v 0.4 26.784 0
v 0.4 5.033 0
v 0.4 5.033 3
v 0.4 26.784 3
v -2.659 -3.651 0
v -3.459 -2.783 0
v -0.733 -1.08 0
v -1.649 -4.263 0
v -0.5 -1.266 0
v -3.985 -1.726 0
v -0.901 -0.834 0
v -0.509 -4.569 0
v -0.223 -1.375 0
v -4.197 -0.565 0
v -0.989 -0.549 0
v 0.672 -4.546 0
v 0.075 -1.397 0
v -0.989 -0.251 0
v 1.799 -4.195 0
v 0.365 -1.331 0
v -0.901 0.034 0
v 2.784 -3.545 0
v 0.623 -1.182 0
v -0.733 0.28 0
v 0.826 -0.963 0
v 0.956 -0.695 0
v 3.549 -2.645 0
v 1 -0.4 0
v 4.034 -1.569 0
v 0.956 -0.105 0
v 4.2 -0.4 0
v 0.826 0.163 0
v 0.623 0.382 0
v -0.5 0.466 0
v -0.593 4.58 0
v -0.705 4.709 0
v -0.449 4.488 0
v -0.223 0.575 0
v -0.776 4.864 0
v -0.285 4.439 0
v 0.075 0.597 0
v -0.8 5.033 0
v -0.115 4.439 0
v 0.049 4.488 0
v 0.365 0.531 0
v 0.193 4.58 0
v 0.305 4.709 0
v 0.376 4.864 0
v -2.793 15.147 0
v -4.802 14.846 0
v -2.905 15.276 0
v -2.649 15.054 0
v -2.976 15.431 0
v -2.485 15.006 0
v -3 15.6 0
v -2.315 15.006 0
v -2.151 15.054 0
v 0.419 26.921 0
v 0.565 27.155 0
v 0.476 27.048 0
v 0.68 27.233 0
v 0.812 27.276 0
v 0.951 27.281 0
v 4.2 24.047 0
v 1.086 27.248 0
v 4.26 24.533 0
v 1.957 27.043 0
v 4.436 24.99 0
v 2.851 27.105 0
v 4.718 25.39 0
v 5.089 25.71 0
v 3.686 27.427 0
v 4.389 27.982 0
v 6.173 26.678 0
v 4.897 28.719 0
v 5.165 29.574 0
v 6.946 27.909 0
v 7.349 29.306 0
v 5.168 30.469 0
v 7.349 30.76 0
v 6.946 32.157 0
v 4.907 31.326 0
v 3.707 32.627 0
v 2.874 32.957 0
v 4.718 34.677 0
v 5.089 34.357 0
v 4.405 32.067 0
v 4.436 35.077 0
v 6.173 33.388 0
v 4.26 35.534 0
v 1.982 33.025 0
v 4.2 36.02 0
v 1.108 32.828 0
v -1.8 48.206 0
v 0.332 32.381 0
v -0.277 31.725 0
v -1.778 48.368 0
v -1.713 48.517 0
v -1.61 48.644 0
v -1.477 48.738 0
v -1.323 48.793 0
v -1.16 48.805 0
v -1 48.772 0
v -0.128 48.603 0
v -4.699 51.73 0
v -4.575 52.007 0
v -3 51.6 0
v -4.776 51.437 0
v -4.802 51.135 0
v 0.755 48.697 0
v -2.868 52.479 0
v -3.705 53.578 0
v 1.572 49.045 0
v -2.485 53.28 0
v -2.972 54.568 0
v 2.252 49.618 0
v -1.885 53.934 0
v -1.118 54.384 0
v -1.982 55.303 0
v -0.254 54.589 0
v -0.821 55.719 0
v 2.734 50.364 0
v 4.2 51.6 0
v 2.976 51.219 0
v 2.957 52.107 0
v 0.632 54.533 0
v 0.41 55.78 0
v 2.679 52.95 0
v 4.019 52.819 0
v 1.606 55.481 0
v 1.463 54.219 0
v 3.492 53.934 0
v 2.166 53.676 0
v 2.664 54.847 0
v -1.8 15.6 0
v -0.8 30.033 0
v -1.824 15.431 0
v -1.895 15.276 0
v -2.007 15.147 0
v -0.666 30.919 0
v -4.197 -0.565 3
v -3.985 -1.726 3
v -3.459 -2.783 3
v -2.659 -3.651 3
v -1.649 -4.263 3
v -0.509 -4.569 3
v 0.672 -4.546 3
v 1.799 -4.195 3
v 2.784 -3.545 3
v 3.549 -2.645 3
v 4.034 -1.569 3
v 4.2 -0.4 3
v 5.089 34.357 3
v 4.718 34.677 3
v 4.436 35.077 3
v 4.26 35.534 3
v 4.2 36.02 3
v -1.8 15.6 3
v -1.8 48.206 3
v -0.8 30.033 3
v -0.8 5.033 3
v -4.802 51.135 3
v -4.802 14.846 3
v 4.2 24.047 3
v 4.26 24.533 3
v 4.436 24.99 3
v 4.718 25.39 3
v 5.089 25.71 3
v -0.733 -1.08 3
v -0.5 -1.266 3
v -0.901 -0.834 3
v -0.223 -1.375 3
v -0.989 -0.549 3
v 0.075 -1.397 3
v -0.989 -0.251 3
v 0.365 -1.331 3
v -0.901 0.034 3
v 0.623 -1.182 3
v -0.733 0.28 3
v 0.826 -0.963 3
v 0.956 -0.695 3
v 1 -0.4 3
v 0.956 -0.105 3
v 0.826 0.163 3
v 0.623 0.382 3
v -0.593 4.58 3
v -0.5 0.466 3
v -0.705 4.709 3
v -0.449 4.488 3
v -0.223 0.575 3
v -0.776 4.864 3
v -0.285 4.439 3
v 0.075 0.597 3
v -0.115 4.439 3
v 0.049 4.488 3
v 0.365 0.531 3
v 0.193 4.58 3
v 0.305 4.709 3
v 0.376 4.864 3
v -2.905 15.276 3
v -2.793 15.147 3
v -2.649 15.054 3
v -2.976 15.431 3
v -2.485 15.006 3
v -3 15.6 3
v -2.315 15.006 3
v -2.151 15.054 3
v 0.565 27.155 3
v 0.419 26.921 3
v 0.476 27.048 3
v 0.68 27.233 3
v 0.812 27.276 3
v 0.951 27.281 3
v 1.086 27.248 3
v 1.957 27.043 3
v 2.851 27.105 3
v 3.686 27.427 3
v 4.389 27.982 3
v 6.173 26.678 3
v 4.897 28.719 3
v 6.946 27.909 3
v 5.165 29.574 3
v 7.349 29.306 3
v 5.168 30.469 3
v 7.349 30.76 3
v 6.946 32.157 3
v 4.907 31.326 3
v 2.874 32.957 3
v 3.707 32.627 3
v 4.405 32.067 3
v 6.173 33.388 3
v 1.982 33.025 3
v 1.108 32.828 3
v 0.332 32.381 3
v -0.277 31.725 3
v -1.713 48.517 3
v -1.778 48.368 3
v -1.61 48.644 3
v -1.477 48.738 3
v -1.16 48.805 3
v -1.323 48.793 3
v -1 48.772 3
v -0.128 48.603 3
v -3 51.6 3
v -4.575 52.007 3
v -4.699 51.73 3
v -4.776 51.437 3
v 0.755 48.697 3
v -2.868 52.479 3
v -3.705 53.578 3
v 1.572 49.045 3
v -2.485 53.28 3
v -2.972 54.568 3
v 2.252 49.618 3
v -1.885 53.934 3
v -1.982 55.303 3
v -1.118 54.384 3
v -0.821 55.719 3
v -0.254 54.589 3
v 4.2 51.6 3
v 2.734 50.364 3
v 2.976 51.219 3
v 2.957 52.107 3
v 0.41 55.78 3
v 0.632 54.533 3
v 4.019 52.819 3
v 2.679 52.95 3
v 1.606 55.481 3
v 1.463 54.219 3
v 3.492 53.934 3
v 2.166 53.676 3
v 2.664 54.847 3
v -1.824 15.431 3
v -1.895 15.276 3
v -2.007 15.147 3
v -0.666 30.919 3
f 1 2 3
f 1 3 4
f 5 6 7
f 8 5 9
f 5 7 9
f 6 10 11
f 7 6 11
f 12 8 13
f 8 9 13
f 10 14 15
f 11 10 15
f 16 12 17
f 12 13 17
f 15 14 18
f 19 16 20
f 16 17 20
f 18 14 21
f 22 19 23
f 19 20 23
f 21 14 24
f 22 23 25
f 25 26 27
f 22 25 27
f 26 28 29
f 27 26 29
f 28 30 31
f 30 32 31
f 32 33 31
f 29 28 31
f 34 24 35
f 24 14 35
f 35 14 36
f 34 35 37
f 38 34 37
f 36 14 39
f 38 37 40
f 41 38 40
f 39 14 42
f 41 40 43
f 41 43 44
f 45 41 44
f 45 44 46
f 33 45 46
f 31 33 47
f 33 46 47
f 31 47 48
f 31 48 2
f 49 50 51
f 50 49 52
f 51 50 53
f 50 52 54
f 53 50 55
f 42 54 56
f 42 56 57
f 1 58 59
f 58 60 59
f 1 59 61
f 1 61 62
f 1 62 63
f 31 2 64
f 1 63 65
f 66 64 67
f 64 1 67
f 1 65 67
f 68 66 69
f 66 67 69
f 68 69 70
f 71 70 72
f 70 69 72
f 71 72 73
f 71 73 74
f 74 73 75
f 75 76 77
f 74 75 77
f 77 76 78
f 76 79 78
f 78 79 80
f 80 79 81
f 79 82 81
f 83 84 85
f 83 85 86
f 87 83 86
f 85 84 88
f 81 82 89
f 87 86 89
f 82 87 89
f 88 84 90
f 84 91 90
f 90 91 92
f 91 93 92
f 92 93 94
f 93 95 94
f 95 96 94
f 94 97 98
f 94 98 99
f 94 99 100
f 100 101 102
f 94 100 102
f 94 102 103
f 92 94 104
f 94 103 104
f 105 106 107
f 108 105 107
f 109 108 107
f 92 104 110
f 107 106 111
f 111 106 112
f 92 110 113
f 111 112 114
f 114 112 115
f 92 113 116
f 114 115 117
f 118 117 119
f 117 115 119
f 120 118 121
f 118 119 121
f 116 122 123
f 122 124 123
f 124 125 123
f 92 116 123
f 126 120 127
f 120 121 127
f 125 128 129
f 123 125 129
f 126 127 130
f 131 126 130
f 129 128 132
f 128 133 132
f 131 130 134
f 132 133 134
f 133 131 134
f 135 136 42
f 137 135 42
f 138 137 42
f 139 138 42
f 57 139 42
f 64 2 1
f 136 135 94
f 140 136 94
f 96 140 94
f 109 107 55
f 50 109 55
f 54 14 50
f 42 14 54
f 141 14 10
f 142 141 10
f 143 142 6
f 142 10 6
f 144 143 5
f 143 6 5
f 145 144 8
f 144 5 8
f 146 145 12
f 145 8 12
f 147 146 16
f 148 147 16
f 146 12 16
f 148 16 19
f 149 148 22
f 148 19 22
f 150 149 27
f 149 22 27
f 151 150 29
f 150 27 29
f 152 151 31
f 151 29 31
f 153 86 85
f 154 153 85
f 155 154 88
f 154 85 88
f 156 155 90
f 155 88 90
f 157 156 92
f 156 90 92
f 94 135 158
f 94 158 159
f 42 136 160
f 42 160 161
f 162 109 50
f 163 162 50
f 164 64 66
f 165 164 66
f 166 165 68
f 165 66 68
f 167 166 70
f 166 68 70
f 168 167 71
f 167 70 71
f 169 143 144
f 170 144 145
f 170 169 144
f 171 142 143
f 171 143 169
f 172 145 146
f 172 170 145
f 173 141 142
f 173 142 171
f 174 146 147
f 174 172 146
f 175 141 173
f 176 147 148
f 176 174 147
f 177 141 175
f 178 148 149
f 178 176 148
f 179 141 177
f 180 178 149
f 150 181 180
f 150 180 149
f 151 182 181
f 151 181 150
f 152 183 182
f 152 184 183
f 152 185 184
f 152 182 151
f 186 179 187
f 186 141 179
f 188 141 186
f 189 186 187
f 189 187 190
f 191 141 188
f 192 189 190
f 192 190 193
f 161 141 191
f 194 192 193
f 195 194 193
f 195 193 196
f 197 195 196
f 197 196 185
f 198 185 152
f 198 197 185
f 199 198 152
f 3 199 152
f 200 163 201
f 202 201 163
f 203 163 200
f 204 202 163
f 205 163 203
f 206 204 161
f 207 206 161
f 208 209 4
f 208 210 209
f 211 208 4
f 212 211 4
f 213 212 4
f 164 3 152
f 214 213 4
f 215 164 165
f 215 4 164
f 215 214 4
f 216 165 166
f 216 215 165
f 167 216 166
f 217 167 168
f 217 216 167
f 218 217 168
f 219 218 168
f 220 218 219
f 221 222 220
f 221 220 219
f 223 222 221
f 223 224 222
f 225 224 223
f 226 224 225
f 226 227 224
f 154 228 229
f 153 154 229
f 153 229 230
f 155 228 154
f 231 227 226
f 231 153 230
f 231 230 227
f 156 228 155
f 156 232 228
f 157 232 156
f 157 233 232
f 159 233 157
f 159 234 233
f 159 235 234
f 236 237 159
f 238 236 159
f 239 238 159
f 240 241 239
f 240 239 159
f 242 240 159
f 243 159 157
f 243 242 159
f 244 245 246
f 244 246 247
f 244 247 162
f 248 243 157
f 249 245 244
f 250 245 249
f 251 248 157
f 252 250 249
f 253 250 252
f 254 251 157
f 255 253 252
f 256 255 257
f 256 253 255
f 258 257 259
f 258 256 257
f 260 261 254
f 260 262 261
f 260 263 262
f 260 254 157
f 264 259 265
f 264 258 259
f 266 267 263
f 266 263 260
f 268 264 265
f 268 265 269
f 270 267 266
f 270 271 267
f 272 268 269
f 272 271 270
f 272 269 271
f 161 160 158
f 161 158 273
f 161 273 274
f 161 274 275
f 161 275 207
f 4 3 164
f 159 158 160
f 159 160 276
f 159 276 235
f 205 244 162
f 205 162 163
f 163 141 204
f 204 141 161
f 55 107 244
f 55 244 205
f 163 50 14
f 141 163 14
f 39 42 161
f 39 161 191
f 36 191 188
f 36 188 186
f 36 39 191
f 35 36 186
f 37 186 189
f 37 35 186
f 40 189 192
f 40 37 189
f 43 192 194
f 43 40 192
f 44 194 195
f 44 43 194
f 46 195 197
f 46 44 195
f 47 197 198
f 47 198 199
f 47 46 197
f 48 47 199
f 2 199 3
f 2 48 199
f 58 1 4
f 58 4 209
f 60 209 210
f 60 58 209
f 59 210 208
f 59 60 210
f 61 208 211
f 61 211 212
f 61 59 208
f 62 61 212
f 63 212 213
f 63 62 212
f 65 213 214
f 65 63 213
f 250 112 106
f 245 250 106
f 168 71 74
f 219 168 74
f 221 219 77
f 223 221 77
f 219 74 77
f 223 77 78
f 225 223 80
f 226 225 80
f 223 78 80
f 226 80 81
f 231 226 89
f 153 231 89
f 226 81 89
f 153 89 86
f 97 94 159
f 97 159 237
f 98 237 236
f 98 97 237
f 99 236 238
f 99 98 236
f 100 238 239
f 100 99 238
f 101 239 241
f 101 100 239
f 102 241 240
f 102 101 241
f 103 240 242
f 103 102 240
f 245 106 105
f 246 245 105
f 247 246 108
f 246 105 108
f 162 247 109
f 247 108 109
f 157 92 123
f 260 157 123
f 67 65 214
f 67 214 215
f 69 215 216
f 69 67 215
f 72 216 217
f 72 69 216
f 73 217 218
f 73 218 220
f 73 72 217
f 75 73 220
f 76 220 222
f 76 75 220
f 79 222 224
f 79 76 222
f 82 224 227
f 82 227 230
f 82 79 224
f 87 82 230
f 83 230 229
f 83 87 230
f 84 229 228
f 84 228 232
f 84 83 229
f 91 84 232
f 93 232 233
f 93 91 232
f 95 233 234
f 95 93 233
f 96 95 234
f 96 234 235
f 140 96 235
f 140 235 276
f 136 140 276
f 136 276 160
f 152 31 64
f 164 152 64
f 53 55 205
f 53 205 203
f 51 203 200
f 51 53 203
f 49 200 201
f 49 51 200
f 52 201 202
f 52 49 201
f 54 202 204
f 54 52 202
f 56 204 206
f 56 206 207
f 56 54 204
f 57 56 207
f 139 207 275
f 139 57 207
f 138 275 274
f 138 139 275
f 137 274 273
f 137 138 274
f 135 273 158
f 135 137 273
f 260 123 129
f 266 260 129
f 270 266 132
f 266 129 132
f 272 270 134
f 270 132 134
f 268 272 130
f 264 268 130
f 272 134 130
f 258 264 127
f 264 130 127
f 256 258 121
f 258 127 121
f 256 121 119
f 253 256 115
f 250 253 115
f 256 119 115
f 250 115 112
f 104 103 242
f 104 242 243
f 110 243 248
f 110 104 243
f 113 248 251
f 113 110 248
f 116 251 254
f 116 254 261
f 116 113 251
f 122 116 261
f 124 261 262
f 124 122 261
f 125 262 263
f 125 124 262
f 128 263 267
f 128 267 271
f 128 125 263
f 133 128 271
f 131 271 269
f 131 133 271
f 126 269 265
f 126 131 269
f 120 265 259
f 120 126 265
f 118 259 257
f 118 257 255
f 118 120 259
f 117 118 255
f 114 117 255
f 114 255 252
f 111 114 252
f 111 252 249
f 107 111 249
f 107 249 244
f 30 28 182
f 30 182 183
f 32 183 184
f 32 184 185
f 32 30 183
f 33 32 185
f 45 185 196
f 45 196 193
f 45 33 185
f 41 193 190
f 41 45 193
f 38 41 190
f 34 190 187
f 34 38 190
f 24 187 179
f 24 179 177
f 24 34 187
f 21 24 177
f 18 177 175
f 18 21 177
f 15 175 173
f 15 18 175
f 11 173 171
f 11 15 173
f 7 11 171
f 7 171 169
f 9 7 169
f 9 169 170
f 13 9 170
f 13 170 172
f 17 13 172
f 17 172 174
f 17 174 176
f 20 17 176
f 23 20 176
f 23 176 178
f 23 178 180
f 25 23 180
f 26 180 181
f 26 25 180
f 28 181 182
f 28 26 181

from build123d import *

# Parameters (mm, degrees)
SKETCH_1_R      = 1
EXTRUDE_1_DEPTH = 3


with BuildPart() as part:
    # 草图1 → 凸台-拉伸1 (new body)
    with BuildSketch(Plane.XY):
        with BuildLine():
            Line((-4.801725368, 51.134970407), (-4.801725368, 14.84551668))
            Line((-4.801725368, 14.84551668), (-4.196767432, -0.56475169))
            ThreePointArc((-4.196767432, -0.56475169), (0.0823917, -4.59919178), (4.2, -0.4))
            Line((4.2, -0.4), (4.2, 3))
            Line((4.2, 3), (4.2, 24.046707274))
            ThreePointArc((4.2, 24.046707274), (4.436165793, 24.989516316), (5.088888889, 25.709666113))
            ThreePointArc((5.088888889, 25.709666113), (7.4, 30.033359093), (5.088888889, 34.357052074))
            ThreePointArc((5.088888889, 34.357052074), (4.436165793, 35.077201871), (4.2, 36.020010912))
            Line((4.2, 36.020010912), (4.2, 47.4))
            Line((4.2, 47.4), (4.2, 51.6))
            ThreePointArc((4.2, 51.6), (1.019230191, 55.674453315), (-3.705318961, 53.577526587))
            Line((-3.705318961, 53.577526587), (-4.574814921, 52.00679382))
            ThreePointArc((-4.574814921, 52.00679382), (-4.743693388, 51.585307183), (-4.801725368, 51.134970407))
        make_face()
        with Locations((0, -0.4)):
            Circle(SKETCH_1_R, mode=Mode.SUBTRACT)
        with BuildLine():
            Line((-1.8, 15.6), (-1.8, 48.20588745))
            ThreePointArc((-1.8, 48.20588745), (-1.546410162, 48.695785399), (-1, 48.771572875))
            ThreePointArc((-1, 48.771572875), (2.449489743, 53.332050808), (-3, 51.6))
            Line((-3, 51.6), (-3, 15.6))
            ThreePointArc((-3, 15.6), (-2.4, 15), (-1.8, 15.6))
        make_face(mode=Mode.SUBTRACT)
        with BuildLine():
            Line((-0.8, 30.033359093), (-0.8, 5.033359093))
            ThreePointArc((-0.8, 5.033359093), (-0.2, 4.433359093), (0.4, 5.033359093))
            Line((0.4, 5.033359093), (0.4, 26.783743731))
            ThreePointArc((0.4, 26.783743731), (0.619694045, 27.197783067), (1.085714286, 27.247974497))
            ThreePointArc((1.085714286, 27.247974497), (4.684236014, 31.715194825), (-0.8, 30.033359093))
        make_face(mode=Mode.SUBTRACT)
    extrude(amount=EXTRUDE_1_DEPTH)


solid = part.part
